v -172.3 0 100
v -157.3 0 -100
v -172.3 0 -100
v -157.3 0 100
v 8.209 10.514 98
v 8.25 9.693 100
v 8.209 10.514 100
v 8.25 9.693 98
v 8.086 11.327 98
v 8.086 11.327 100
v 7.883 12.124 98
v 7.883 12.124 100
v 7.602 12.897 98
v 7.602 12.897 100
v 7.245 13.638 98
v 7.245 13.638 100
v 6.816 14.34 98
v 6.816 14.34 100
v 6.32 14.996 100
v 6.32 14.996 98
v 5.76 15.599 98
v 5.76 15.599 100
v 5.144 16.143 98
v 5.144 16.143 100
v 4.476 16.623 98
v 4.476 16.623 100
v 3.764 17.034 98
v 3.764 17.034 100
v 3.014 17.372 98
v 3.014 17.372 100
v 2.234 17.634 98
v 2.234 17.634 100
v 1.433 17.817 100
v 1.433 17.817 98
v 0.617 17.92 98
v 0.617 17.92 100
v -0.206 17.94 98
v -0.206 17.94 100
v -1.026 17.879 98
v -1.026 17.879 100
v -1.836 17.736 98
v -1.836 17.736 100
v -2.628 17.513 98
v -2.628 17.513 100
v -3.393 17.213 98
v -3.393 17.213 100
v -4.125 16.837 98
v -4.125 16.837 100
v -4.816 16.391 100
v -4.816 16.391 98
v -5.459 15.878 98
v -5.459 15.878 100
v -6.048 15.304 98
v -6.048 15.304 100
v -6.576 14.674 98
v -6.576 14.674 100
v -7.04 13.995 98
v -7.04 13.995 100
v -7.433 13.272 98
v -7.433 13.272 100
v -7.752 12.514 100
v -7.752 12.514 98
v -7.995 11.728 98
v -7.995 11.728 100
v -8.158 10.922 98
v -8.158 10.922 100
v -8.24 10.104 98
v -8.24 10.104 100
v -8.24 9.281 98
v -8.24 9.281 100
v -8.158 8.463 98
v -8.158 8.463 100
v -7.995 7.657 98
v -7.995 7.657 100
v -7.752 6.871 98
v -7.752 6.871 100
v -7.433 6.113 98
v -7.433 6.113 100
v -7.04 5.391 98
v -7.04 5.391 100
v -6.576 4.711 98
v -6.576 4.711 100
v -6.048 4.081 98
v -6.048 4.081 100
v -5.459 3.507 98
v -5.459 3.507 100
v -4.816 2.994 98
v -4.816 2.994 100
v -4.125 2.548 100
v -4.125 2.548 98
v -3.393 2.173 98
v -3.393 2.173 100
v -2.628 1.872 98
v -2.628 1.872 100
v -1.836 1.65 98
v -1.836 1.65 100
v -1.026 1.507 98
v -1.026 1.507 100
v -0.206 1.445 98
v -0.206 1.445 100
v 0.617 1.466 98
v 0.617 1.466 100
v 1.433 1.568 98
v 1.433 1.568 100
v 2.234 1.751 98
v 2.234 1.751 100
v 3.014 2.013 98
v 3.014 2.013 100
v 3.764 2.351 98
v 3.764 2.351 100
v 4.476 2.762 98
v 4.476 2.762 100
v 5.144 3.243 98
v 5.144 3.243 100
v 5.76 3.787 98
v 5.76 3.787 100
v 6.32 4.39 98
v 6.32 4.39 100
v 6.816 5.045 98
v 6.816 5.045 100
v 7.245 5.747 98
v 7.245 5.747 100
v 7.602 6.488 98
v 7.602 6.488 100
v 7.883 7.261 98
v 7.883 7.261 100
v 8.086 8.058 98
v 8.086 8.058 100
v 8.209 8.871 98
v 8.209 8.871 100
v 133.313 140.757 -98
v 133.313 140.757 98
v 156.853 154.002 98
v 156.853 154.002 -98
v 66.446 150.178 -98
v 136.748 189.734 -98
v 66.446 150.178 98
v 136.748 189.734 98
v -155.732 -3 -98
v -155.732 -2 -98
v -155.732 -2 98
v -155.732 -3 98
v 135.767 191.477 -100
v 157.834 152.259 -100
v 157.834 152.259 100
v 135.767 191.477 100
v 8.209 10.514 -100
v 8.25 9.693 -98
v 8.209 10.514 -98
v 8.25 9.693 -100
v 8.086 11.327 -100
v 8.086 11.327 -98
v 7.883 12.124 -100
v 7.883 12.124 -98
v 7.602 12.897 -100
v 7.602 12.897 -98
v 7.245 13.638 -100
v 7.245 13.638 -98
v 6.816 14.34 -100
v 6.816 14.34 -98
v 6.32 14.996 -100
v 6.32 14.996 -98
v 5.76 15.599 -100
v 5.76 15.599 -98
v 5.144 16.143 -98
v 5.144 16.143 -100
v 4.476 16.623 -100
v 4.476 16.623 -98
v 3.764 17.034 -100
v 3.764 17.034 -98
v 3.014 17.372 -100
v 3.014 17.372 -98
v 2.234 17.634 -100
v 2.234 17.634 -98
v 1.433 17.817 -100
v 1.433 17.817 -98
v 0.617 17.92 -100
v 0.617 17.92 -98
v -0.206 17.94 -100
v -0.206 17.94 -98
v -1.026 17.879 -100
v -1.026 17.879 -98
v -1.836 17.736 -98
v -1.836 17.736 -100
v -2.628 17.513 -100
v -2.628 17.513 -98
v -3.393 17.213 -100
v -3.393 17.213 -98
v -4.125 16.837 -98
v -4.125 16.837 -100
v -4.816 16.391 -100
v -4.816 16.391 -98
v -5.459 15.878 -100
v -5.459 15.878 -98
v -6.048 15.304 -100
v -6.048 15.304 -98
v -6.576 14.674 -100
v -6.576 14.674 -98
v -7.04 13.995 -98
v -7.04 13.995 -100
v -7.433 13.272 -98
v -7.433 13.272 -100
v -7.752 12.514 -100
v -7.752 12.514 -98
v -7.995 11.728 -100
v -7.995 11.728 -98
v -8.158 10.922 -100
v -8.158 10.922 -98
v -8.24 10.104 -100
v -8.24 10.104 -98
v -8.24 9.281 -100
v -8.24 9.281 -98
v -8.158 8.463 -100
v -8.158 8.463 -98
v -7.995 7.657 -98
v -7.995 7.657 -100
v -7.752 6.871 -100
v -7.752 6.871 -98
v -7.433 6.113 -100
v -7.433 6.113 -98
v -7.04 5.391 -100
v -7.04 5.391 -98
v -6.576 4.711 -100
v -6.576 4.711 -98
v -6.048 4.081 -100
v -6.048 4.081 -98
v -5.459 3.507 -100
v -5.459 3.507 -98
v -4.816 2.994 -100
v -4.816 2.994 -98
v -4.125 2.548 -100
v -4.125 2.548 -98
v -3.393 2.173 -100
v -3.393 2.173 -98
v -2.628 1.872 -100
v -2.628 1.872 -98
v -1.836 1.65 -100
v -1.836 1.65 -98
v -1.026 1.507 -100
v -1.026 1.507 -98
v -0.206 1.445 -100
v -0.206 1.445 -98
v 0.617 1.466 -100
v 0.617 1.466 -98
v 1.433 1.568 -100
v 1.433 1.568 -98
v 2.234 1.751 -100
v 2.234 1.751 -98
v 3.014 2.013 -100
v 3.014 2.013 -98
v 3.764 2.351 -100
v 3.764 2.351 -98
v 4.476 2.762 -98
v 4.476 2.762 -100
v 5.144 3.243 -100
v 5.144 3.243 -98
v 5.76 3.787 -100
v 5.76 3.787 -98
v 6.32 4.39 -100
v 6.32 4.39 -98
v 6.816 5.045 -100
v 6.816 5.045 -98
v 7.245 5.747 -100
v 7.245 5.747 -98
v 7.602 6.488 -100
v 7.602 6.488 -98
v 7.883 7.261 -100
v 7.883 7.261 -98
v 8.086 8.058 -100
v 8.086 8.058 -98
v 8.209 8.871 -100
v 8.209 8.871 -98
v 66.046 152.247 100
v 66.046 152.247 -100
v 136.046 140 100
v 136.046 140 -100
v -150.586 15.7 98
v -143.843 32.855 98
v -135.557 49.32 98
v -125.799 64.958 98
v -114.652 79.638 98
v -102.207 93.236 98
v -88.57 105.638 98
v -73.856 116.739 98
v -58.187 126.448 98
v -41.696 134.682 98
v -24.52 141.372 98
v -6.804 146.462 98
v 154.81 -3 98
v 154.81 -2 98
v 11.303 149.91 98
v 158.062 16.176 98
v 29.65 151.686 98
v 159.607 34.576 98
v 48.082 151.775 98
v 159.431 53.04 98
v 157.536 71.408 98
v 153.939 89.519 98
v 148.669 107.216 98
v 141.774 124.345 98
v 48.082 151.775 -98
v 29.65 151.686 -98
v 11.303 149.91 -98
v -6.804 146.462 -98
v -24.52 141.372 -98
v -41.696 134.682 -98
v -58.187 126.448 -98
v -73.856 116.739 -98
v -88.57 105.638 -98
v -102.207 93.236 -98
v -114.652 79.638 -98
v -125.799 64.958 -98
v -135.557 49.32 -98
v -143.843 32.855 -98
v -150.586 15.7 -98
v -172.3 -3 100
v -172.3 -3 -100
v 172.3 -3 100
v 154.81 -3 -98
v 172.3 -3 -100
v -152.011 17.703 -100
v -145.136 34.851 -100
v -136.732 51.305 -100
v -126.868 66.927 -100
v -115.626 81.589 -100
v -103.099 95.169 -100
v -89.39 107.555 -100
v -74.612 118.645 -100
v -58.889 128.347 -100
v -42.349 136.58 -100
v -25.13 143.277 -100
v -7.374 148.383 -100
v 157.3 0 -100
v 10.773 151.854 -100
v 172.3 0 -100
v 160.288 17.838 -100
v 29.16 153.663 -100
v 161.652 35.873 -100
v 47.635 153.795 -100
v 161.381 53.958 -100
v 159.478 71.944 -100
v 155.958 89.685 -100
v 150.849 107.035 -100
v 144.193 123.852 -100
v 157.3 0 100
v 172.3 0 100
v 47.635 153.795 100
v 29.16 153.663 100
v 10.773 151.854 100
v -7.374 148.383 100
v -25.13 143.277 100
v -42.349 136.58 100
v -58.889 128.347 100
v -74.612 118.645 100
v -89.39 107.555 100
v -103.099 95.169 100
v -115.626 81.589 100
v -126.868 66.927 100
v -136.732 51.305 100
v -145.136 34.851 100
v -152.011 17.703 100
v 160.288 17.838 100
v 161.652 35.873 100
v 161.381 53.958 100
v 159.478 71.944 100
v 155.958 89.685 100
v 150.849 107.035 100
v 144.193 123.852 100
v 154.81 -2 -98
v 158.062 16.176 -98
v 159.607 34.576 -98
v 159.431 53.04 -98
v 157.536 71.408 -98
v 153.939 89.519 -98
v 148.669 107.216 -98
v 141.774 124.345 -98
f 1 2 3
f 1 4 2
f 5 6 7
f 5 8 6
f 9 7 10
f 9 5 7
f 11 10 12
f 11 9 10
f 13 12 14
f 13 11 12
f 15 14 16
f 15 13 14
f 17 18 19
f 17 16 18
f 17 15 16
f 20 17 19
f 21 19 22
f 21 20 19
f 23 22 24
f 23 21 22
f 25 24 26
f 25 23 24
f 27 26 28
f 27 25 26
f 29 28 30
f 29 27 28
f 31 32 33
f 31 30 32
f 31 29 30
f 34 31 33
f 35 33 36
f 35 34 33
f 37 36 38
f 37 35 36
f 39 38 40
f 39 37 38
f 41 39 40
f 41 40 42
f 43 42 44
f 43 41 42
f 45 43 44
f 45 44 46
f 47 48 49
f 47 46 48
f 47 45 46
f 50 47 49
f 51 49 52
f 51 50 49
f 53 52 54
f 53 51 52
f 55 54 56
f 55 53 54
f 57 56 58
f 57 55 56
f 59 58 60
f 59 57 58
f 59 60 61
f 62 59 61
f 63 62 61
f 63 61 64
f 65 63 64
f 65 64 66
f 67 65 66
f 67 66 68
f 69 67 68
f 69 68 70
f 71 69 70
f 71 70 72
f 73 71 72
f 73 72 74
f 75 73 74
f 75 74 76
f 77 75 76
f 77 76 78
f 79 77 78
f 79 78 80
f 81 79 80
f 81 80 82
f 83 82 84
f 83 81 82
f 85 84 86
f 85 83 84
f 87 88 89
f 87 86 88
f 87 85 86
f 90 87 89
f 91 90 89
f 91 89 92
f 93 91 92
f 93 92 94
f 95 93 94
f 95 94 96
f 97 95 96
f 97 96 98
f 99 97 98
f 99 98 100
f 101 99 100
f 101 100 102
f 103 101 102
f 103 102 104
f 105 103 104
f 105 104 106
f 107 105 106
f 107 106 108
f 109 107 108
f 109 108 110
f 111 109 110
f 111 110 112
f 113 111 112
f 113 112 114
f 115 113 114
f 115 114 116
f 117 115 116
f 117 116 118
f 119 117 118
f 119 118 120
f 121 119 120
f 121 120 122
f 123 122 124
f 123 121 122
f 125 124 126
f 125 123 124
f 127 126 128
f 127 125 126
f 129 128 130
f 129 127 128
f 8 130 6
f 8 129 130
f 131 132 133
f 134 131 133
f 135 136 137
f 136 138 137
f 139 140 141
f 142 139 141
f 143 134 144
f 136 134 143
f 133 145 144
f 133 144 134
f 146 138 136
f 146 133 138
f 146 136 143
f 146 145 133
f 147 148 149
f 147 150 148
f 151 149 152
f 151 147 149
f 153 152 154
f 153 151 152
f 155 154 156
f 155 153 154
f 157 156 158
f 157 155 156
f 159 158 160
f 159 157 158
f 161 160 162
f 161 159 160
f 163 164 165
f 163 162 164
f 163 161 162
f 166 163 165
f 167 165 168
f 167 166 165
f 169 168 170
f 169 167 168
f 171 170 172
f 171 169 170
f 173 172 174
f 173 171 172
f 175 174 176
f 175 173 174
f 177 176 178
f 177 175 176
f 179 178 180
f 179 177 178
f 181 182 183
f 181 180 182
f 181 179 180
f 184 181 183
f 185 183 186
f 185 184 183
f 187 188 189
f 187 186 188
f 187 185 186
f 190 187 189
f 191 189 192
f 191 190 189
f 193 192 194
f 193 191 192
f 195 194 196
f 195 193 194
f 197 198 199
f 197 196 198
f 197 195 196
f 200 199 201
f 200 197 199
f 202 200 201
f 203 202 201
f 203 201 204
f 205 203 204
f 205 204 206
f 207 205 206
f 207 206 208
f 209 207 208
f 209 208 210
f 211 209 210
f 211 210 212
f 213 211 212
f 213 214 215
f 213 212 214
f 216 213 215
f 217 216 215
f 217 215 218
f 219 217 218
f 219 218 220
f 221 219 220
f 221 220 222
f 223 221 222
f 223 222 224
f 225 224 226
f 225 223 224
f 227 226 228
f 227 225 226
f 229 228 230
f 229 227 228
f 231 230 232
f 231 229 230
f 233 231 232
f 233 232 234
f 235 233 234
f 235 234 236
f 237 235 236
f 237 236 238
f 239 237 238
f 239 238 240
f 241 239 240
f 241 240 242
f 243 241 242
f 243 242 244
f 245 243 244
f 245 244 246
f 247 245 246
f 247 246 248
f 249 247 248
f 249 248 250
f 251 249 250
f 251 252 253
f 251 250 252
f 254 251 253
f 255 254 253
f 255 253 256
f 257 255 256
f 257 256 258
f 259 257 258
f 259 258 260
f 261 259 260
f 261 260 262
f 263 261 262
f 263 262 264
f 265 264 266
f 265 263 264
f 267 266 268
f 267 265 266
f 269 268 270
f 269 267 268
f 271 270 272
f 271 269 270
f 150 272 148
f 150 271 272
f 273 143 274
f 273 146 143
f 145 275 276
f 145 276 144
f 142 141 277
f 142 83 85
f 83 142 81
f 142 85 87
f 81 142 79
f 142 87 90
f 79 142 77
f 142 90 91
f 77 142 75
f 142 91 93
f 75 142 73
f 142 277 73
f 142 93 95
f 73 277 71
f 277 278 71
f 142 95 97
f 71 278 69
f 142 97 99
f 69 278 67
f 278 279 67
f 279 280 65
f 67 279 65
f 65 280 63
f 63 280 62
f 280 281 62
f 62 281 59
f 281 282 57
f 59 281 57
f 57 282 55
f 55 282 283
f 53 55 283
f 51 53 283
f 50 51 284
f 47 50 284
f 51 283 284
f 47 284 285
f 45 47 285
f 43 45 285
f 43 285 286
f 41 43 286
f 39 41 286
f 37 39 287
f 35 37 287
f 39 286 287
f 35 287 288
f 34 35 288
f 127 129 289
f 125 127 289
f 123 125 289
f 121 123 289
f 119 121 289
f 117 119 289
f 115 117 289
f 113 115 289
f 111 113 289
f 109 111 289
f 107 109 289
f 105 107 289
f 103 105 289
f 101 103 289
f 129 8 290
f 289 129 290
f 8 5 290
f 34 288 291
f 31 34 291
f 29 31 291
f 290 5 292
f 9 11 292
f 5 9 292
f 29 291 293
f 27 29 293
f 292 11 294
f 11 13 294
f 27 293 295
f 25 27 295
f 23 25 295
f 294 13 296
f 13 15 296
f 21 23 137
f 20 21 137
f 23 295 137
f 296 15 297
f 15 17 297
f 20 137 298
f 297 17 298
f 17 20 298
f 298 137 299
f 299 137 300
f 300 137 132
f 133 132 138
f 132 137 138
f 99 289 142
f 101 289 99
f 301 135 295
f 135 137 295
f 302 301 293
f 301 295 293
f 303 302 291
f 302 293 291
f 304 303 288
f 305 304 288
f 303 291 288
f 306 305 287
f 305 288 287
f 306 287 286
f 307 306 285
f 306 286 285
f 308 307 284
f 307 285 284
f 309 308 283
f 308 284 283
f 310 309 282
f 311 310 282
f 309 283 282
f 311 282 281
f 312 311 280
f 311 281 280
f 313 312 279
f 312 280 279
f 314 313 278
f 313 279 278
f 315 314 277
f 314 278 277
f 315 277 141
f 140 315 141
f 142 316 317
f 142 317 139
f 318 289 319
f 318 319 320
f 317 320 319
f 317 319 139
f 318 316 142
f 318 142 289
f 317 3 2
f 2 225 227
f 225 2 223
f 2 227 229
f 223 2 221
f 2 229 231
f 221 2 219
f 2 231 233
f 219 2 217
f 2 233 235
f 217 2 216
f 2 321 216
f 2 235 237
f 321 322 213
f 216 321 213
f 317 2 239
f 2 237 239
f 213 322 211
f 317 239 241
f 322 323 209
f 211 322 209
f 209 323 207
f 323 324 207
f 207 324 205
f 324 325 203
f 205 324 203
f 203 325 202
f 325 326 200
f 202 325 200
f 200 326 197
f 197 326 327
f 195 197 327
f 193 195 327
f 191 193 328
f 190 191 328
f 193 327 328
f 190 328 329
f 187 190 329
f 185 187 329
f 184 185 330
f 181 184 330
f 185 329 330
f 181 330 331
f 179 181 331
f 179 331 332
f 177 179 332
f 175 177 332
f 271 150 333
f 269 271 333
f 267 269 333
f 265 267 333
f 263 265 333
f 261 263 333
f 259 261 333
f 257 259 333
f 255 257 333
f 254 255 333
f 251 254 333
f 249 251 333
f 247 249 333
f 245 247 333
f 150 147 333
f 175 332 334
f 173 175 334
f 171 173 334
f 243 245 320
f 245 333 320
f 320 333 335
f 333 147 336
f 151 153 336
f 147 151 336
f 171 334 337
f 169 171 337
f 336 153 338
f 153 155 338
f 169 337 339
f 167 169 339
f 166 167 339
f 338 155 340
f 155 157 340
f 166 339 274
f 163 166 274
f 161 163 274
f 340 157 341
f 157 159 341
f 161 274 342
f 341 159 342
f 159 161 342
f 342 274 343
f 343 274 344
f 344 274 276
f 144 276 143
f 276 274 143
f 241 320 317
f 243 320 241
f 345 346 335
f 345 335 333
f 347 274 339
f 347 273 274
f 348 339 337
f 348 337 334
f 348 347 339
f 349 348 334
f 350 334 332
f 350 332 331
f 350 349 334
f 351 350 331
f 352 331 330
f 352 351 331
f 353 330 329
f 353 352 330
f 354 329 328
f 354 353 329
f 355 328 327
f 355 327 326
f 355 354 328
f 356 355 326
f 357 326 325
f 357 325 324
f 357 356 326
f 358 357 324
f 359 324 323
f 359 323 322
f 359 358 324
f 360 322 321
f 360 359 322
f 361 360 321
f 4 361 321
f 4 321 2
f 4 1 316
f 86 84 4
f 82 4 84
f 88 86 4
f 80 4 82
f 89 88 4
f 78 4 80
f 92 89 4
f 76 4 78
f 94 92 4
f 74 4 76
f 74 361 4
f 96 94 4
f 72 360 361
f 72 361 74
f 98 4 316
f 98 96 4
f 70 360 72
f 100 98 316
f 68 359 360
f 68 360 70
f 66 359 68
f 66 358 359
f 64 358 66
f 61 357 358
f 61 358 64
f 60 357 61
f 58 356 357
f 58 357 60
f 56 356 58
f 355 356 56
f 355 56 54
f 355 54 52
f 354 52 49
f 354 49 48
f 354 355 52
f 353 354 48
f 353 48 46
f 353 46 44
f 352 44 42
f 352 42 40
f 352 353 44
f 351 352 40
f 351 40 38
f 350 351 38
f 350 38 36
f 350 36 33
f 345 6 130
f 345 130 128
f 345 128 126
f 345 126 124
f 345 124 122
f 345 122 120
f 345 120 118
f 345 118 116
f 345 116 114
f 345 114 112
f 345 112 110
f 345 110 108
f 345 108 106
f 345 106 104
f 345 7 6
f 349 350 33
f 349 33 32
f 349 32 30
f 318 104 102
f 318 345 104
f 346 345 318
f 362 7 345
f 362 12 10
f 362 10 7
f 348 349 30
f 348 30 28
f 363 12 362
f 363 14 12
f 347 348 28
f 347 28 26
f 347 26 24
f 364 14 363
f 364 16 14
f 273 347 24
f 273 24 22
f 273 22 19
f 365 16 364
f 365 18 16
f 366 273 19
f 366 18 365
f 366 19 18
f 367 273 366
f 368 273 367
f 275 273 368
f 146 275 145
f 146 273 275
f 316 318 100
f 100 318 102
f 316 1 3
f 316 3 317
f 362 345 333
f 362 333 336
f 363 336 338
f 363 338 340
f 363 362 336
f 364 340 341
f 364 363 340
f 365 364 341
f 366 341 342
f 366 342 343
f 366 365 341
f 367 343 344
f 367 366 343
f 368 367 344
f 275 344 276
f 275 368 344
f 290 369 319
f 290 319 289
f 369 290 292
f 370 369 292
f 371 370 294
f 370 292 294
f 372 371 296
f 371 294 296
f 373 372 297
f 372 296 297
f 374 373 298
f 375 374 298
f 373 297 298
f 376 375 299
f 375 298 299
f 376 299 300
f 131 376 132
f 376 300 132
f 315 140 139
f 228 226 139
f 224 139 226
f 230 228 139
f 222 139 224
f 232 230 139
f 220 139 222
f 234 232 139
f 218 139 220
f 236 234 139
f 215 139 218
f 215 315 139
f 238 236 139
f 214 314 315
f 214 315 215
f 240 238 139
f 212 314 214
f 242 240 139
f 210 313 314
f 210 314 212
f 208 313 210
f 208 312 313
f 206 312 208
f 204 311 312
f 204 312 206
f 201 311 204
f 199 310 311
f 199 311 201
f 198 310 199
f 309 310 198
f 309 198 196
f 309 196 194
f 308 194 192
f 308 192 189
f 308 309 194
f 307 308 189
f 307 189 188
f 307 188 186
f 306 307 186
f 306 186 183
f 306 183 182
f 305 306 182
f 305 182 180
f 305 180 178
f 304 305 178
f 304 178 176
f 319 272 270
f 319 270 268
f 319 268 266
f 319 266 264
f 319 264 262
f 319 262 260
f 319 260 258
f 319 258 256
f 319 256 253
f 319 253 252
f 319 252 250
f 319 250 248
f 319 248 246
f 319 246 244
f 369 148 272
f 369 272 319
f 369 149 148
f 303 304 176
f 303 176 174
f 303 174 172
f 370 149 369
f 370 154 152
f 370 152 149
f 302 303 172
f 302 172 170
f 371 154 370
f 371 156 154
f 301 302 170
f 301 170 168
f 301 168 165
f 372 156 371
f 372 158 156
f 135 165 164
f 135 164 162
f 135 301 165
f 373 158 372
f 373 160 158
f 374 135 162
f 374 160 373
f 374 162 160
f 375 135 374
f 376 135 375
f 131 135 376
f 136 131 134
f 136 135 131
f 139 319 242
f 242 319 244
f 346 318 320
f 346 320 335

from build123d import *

# Parameters (mm, degrees)
BOSS_EXTRUDE1_DEPTH     = 100
SHELL1_T                = -2
SKETCH4_W               = 14.567996804
SKETCH4_H               = 196
SKETCH4_W_2             = 15.490077846
BOSS_EXTRUDE2_DEPTH     = 1
CUT_EXTRUDE1_DEPTH      = 327.114830331
CUT_EXTRUDE1_DEPTH_BACK = 327.114830331
SKETCH5_R               = 8.25


with BuildPart() as part:
    # Sketch1 → Boss-Extrude1 (new, symmetric)
    with BuildSketch(Plane.XY):
        with BuildLine():
            Line((-157.3, 0), (-172.3, 0))
            Line((-172.3, 0), (-172.3, -3))
            Line((-172.3, -3), (172.3, -3))
            Line((172.3, -3), (172.3, 0))
            Line((172.3, 0), (157.3, 0))
            ThreePointArc((157.3, 0), (159.477998018, 71.943974663), (136.046041615, 140))
            Line((136.046041615, 140), (157.833839596, 152.259358023))
            Line((157.833839596, 152.259358023), (135.766995153, 191.477394389))
            Line((135.766995153, 191.477394389), (66.046041615, 152.247448714))
            ThreePointArc((66.046041615, 152.247448714), (-74.612286943, 118.644986984), (-157.3, 0))
        make_face()
    extrude(amount=BOSS_EXTRUDE1_DEPTH, both=True)

    # Shell1
    shell1_openings = [part.faces().sort_by_distance(p)[0] for p in [
        (146.800417374, 171.868376206, 0),
        (0, -3, 0),
    ]]
    offset(amount=SHELL1_T, openings=shell1_openings, kind=Kind.INTERSECTION)

    # Sketch4 → Boss-Extrude2 (add)
    with BuildSketch(Plane.XZ.offset(2)):
        with Locations((-163.016001598, 0)):
            Rectangle(SKETCH4_W, SKETCH4_H)
        with Locations((162.554961077, 0)):
            Rectangle(SKETCH4_W_2, SKETCH4_H)
    extrude(amount=BOSS_EXTRUDE2_DEPTH)

    # Sketch5 → Cut-Extrude1 (cut, two sides: drawn at the far end of the back side and taken through both)
    with BuildSketch(Plane.XY.offset(100).offset(-CUT_EXTRUDE1_DEPTH_BACK)):
        with Locations((0, 9.692663859)):
            Circle(SKETCH5_R)
    extrude(amount=CUT_EXTRUDE1_DEPTH + CUT_EXTRUDE1_DEPTH_BACK, mode=Mode.SUBTRACT)


solid = part.part
